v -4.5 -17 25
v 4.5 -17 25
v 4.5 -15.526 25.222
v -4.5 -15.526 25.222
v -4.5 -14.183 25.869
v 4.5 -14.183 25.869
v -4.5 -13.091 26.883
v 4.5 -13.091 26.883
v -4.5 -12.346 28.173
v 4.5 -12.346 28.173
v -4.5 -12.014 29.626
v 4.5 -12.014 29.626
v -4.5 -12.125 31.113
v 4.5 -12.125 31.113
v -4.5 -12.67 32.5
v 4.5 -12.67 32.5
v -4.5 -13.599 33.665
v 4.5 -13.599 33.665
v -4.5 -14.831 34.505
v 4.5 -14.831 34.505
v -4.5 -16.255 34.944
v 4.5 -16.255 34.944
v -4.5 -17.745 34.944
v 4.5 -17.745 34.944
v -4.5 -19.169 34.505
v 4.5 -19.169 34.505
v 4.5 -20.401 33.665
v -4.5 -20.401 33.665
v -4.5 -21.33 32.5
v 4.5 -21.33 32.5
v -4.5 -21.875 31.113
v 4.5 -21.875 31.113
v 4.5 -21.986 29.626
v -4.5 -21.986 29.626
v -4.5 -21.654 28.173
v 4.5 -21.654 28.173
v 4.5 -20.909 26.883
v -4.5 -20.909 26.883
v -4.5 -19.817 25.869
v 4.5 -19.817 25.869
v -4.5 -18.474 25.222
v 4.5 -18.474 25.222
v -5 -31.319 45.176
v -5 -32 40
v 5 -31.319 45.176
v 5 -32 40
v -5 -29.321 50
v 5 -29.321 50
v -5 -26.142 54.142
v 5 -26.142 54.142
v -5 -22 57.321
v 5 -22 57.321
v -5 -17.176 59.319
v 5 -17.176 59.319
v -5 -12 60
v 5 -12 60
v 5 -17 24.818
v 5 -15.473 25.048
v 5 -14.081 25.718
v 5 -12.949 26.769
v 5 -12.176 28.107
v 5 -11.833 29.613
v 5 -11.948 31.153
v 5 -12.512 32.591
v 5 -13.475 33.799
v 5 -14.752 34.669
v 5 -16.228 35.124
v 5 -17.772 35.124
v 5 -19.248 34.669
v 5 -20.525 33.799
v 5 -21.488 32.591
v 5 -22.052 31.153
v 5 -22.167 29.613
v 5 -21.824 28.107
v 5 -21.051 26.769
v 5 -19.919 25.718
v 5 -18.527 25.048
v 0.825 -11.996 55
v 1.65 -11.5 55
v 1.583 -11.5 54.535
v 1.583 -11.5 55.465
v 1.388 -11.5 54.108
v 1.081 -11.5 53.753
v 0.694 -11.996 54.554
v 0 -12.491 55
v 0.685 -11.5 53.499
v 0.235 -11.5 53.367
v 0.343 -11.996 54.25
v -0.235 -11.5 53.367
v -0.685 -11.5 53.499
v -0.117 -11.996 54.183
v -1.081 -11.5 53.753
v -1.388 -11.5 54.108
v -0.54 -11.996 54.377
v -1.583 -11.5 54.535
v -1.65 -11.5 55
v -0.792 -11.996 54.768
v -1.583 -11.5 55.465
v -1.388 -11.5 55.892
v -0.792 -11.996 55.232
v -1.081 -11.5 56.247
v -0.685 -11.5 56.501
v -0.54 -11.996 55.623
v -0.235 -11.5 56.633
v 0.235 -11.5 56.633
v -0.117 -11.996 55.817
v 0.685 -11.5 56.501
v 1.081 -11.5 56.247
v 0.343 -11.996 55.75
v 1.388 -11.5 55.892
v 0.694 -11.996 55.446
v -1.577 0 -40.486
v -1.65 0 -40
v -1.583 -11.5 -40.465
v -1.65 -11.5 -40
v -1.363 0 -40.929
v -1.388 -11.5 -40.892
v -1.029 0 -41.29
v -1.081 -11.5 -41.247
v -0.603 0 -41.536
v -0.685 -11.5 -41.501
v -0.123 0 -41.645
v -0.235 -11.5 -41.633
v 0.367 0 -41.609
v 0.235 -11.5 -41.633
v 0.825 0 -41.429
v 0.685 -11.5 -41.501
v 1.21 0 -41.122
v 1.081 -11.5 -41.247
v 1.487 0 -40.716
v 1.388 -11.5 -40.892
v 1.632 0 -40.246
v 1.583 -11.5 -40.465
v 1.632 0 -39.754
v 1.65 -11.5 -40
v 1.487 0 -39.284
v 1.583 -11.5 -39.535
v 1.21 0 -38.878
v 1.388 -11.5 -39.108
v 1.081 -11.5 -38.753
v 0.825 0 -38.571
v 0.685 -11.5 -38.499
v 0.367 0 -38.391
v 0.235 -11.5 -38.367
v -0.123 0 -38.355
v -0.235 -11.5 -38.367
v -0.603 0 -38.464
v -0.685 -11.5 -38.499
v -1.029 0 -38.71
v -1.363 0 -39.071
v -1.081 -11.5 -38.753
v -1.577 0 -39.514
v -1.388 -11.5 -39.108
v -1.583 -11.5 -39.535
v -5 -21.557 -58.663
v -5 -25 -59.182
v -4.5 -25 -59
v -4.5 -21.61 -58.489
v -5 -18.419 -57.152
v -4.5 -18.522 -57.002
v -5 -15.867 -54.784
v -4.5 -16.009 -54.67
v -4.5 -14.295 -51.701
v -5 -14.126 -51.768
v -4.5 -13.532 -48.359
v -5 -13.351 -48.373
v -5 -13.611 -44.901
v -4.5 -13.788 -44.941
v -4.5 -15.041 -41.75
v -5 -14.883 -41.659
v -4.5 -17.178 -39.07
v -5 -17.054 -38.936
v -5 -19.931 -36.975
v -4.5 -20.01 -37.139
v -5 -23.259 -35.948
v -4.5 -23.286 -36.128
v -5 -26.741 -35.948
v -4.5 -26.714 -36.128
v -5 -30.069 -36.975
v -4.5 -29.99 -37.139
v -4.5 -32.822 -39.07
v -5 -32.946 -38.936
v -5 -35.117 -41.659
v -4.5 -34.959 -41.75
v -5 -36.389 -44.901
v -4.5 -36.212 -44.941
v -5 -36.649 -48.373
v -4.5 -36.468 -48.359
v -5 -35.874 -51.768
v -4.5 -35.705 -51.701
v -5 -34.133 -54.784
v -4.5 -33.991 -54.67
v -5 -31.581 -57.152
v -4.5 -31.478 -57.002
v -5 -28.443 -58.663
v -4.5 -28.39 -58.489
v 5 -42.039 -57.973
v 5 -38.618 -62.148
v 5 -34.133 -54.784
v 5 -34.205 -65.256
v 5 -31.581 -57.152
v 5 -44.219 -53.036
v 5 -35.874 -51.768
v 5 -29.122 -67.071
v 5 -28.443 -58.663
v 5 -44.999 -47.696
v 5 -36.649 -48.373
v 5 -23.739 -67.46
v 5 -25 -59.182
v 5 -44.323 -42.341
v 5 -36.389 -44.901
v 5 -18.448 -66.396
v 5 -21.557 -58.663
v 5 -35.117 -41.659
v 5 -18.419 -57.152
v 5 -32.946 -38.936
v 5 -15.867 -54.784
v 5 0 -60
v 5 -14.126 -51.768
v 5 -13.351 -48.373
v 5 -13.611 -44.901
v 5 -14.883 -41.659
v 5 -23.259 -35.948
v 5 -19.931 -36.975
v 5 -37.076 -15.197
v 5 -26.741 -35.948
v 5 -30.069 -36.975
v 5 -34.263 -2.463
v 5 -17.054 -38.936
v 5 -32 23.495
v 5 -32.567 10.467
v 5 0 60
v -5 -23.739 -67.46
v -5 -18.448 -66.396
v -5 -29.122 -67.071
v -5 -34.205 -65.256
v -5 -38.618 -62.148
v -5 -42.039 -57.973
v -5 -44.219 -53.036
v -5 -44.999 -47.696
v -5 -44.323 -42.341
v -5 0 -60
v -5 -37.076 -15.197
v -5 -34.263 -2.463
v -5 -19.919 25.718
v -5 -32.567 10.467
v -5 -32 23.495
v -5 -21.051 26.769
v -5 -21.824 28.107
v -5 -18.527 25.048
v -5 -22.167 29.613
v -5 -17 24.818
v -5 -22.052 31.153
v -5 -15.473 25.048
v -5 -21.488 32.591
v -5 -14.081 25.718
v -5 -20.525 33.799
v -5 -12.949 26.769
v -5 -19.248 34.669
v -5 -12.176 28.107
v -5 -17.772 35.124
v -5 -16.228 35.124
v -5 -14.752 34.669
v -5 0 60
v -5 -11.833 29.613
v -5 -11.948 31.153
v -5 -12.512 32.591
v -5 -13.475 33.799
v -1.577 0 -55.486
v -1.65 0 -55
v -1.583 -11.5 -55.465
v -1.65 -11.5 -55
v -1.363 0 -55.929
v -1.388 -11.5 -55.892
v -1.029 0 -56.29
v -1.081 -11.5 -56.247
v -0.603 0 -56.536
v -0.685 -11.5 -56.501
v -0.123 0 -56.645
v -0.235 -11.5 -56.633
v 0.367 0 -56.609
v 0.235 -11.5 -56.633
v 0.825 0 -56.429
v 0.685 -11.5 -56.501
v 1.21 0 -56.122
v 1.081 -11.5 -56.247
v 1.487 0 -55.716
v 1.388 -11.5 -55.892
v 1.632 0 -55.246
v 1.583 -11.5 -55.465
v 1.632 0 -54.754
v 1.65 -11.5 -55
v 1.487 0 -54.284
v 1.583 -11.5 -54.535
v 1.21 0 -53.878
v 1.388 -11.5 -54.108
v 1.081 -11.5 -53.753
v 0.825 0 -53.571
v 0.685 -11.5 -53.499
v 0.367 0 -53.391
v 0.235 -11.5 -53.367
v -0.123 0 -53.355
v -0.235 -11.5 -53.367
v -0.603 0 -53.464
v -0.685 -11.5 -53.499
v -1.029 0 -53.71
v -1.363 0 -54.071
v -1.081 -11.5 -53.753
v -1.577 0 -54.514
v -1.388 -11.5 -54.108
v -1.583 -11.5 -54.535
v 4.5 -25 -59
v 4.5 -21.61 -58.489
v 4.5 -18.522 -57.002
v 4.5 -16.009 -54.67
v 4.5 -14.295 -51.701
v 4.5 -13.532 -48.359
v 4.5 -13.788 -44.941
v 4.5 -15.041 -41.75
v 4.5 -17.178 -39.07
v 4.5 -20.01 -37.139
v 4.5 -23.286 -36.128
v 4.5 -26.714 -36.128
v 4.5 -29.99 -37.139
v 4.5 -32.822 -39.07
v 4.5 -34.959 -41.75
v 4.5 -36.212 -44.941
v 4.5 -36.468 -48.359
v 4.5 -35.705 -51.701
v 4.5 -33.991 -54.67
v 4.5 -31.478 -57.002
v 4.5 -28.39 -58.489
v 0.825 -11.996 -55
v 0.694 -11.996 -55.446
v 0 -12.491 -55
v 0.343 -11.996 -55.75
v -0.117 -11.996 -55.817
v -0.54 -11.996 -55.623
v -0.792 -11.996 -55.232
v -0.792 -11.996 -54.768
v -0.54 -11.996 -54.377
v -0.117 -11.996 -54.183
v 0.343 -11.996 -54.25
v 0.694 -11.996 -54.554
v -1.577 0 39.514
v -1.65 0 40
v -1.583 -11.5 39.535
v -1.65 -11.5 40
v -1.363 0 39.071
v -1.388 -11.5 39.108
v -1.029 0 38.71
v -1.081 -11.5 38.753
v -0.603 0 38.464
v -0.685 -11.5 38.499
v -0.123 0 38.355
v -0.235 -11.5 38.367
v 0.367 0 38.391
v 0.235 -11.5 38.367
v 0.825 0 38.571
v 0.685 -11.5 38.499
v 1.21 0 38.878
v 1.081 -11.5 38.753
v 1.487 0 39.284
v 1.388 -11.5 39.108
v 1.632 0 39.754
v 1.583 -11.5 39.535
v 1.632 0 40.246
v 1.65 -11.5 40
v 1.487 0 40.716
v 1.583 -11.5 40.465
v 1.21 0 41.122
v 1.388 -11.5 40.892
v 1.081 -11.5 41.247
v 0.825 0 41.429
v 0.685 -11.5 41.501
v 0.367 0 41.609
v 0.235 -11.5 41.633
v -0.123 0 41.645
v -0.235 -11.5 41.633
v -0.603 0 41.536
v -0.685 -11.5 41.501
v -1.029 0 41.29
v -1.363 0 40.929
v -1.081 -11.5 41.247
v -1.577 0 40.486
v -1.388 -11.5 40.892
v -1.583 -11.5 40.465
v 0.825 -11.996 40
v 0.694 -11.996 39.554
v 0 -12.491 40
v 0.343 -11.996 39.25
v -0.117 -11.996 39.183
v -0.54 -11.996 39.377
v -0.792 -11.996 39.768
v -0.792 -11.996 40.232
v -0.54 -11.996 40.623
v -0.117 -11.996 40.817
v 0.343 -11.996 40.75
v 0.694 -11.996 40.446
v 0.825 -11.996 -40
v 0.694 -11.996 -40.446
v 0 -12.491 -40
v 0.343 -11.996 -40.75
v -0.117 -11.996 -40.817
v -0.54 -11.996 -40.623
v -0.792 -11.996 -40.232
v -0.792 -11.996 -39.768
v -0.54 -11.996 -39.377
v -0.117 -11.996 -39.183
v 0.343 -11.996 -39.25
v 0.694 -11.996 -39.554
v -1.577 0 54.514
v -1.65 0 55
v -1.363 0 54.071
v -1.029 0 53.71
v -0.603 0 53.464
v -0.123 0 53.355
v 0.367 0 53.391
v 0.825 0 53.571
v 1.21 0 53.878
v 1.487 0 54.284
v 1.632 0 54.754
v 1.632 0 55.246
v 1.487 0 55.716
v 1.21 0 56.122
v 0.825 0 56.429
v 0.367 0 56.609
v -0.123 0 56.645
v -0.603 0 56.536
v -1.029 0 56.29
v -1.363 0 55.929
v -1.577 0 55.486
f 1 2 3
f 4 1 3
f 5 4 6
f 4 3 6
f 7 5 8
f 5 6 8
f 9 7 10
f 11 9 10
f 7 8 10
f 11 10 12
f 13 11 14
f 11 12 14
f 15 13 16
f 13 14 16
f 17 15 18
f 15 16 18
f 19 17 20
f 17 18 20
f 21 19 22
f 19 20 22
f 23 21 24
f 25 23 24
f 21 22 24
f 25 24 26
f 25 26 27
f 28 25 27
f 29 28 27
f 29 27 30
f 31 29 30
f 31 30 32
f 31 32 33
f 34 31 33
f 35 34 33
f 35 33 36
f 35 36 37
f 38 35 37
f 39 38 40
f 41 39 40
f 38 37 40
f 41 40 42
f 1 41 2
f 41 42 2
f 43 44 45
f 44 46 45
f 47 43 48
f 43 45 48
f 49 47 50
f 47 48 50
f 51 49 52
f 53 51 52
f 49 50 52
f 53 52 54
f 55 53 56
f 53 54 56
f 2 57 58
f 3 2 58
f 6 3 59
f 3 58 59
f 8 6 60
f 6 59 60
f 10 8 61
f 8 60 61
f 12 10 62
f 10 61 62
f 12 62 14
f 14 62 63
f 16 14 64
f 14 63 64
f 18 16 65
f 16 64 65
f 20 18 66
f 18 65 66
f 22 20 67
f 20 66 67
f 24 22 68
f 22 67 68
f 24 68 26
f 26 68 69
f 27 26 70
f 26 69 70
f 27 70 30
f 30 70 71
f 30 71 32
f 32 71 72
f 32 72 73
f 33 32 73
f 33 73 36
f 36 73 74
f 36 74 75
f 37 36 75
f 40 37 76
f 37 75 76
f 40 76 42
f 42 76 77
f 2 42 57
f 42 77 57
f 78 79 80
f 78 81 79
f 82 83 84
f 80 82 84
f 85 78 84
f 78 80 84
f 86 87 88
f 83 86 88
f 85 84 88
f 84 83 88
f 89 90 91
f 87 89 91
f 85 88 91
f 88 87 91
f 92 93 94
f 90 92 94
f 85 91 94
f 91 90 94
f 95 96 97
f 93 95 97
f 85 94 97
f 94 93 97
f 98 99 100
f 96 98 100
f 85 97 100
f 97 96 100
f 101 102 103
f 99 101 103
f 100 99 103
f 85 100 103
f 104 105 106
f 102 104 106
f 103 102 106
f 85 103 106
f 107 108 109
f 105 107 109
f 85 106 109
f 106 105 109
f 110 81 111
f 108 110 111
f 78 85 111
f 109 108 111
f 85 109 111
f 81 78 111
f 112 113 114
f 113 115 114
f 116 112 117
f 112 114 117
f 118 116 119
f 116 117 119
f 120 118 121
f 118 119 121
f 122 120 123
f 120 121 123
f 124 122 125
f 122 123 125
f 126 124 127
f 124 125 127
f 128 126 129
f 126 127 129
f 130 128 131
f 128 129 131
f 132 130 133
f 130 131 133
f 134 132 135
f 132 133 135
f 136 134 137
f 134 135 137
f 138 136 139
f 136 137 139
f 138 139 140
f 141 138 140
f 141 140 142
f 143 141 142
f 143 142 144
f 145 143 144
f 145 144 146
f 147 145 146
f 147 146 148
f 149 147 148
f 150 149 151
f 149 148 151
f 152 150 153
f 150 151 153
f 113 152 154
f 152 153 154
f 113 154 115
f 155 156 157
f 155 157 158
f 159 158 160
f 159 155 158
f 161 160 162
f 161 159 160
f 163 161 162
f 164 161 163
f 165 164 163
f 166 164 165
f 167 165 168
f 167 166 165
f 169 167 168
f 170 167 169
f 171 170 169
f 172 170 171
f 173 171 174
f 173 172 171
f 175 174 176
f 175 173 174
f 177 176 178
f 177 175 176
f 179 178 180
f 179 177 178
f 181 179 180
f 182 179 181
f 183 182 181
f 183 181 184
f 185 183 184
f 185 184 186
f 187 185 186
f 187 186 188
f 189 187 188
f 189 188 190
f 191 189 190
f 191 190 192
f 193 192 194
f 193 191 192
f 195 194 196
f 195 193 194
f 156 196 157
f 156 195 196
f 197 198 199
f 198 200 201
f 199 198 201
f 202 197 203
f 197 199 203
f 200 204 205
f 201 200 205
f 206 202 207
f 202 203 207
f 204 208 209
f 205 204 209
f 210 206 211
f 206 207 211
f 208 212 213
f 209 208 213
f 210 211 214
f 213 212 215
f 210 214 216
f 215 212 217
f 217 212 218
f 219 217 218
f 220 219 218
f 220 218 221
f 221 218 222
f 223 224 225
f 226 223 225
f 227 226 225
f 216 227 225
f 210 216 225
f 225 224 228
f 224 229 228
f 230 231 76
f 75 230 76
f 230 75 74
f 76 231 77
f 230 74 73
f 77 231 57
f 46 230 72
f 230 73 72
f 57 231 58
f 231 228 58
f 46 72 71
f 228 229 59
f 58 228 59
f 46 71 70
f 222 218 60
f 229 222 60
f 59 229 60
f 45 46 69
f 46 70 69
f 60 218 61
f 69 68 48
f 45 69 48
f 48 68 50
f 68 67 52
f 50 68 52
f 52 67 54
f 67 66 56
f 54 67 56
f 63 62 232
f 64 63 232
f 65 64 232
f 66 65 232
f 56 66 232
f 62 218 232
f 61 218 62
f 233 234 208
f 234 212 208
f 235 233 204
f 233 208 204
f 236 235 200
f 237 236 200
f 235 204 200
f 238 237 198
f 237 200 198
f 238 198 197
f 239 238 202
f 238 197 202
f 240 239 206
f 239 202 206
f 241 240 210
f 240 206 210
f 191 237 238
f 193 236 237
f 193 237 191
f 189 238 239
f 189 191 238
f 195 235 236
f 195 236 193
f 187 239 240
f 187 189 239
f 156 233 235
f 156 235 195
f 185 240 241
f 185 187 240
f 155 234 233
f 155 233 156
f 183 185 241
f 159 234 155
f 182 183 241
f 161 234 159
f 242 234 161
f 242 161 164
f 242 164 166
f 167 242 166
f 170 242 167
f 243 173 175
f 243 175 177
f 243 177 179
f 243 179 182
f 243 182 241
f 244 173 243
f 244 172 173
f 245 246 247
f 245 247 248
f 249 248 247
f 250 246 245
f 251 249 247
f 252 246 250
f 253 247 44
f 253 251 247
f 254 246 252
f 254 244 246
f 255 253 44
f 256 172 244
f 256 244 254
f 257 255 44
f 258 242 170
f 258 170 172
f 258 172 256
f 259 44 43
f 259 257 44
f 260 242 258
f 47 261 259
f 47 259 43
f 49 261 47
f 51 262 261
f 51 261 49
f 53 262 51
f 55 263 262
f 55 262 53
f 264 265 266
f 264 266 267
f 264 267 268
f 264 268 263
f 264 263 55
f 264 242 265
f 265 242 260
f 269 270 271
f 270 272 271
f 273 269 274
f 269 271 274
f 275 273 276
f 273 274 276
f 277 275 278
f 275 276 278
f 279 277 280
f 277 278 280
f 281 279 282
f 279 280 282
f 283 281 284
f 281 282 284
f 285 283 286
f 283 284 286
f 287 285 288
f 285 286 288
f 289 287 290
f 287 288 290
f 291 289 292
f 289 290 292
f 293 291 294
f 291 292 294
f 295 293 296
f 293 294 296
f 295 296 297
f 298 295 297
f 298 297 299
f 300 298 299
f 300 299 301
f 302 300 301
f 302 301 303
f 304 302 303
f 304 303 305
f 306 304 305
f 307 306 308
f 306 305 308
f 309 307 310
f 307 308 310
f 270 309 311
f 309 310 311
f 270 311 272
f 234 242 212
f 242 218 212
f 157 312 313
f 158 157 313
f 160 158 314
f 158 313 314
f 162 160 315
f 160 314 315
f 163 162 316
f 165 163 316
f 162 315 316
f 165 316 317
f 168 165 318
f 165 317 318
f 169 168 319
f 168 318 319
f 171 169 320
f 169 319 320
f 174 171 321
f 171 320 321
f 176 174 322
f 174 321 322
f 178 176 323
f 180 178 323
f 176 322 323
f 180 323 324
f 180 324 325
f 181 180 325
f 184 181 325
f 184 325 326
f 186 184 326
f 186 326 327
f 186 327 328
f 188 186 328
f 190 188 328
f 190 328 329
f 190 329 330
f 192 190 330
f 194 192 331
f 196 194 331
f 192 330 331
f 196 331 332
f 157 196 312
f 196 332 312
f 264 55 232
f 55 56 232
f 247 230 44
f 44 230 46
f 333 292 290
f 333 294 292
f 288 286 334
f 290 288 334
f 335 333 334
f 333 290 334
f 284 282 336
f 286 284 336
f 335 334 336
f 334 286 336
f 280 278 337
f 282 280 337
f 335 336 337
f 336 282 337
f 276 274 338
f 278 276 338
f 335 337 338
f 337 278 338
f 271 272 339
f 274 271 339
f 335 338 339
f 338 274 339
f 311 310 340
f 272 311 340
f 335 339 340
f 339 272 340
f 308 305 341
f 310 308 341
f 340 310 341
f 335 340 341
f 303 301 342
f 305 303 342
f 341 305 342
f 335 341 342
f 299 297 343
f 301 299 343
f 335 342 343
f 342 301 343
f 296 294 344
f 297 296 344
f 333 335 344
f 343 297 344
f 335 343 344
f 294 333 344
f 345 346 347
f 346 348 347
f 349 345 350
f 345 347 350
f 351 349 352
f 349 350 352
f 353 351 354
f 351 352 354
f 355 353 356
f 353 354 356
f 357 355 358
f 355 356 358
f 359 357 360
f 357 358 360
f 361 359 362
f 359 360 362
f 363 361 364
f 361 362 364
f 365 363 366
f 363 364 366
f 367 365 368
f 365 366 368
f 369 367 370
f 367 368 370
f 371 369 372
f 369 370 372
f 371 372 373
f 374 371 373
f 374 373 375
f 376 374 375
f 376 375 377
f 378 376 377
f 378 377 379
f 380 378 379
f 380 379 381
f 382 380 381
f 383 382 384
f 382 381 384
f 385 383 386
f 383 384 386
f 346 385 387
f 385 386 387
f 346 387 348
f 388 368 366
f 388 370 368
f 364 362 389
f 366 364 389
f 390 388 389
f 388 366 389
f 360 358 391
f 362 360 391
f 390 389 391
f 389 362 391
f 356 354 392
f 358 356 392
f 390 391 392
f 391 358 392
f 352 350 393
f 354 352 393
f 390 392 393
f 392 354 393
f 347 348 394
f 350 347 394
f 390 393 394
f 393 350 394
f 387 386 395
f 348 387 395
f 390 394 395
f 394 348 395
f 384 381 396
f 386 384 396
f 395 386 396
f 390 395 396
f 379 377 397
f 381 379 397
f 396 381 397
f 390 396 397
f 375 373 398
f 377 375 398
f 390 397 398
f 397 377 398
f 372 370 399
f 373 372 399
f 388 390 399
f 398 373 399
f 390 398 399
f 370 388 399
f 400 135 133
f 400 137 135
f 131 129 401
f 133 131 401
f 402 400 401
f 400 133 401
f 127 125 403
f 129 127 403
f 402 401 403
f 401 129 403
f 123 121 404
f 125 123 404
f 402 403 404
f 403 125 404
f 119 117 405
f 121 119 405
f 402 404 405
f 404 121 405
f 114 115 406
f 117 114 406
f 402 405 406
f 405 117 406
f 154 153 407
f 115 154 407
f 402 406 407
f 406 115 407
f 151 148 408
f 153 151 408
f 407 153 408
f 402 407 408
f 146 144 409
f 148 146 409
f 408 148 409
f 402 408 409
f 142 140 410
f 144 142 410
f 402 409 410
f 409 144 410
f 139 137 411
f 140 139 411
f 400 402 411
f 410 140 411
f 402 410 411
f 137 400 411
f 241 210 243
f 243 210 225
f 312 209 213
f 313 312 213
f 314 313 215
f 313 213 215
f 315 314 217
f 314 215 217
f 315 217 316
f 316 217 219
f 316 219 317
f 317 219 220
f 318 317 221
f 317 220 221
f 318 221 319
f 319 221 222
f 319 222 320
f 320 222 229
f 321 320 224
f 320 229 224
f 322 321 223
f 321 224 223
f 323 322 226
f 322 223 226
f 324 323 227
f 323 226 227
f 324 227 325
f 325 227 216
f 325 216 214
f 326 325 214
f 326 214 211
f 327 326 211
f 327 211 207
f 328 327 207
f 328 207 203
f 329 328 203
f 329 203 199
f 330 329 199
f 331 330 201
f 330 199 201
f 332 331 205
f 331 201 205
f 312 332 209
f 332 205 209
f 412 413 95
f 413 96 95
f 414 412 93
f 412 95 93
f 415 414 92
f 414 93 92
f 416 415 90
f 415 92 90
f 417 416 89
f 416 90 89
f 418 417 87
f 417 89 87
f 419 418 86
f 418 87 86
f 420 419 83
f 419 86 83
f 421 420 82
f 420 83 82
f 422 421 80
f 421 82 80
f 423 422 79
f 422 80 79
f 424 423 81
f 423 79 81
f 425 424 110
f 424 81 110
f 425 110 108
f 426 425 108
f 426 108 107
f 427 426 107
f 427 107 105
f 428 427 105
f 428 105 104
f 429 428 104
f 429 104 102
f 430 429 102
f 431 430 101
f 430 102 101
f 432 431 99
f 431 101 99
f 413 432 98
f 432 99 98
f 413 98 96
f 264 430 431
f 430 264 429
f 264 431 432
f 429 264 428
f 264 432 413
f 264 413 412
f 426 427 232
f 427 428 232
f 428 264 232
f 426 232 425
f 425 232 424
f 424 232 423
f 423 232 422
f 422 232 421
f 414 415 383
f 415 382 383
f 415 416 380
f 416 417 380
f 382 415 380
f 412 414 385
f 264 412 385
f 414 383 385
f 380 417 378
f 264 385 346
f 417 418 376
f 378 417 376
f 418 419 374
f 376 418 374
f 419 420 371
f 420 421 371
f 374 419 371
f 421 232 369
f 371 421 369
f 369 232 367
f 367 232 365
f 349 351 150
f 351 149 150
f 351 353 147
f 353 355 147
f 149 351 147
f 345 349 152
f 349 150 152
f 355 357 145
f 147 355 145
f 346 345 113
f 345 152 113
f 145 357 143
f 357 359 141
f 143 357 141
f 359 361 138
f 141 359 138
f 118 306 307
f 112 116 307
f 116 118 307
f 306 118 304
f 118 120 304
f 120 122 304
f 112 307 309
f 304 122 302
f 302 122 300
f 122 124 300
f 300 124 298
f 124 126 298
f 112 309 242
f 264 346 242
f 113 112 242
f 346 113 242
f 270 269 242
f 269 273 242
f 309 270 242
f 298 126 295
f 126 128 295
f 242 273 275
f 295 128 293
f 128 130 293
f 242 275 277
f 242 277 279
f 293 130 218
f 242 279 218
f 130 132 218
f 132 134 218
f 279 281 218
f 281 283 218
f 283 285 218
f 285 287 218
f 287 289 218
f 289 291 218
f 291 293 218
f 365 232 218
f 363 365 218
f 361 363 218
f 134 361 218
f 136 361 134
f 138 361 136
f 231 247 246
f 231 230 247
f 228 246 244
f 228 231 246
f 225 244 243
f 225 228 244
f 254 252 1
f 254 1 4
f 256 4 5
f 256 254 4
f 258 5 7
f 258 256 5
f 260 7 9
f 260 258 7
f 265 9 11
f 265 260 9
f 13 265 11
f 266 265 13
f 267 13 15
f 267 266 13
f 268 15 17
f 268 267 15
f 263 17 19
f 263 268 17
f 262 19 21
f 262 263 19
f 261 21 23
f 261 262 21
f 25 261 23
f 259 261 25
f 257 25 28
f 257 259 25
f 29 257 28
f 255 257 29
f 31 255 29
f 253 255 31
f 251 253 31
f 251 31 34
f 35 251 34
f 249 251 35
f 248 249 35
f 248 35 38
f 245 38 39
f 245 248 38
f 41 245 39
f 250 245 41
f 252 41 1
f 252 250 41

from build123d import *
from OCP.BRepFilletAPI import BRepFilletAPI_MakeChamfer

# Parameters (mm, degrees)
BOSS_EXTRUDE1_DEPTH   = 5
SKETCH4_R             = 11.5
CUT_EXTRUDE1_DEPTH    = 10
M4_TAPPED_HOLE1_D     = 3.3
M4_TAPPED_HOLE1_DEPTH = 11.5
M4_TAPPED_HOLE1_TIP   = 0.991420021
SKETCH5_R             = 5
CUT_EXTRUDE2_DEPTH    = 10
FILLET1_R             = 150
FILLET2_R             = 20
CHAMFER1_SIZE         = 0.5
CHAMFER1_SIZE2        = 0.181985117


with BuildPart() as part:
    # Sketch1 → Boss-Extrude1 (new, symmetric)
    with BuildSketch(Plane(origin=(0, 0, 0), x_dir=(0, 0, -1), z_dir=(1, 0, 0))):
        with BuildLine():
            Line((-60, 0), (60, 0))
            Line((60, 0), (66.396399481, -18.448199741))
            ThreePointArc((66.396399481, -18.448199741), (62.147804381, -38.6177027), (42.341065464, -44.323182824))
            Line((42.341065464, -44.323182824), (-3.816355809, -32))
            Line((-3.816355809, -32), (-60, -32))
            Line((-60, -32), (-60, 0))
        make_face()
    extrude(amount=BOSS_EXTRUDE1_DEPTH, both=True)

    # Sketch4 → Cut-Extrude1 (cut)
    with BuildSketch(Plane(origin=(5, 0, 0), x_dir=(0, 0, -1), z_dir=(1, 0, 0))):
        with Locations((47.5, -25)):
            Circle(SKETCH4_R)
    extrude(amount=-CUT_EXTRUDE1_DEPTH, mode=Mode.SUBTRACT)

    # M4 Tapped Hole1
    with Locations(Plane(origin=(0, 0, 0), x_dir=(1, 0, 0), z_dir=(0, 1, 0))):
        with Locations((0, -55), (0, -40), (0, 40), (0, 55)):
            Hole(M4_TAPPED_HOLE1_D / 2, depth=M4_TAPPED_HOLE1_DEPTH)
            with Locations((0, 0, -(M4_TAPPED_HOLE1_DEPTH + M4_TAPPED_HOLE1_TIP / 2))):  # 118° drill point
                Cone(0, M4_TAPPED_HOLE1_D / 2, M4_TAPPED_HOLE1_TIP, mode=Mode.SUBTRACT)

    # Sketch5 → Cut-Extrude2 (cut)
    with BuildSketch(Plane(origin=(5, 0, 0), x_dir=(0, 0, -1), z_dir=(1, 0, 0))):
        with Locations((-30, -17)):
            Circle(SKETCH5_R)
    extrude(amount=-CUT_EXTRUDE2_DEPTH, mode=Mode.SUBTRACT)

    # Fillet1
    fillet1_edges = [part.edges().sort_by_distance(p)[0] for p in [
        (0, -32, 3.816355809),
    ]]
    fillet(fillet1_edges, radius=FILLET1_R)

    # Fillet2
    fillet2_edges = [part.edges().sort_by_distance(p)[0] for p in [
        (0, -32, 60),
    ]]
    fillet(fillet2_edges, radius=FILLET2_R)

    # Chamfer1: one chamfer whose edges measure the first distance from different faces: ONE call of the kernel's chamfer builder (chamfer() names one face for all edges)
    chamfer1_edges_1 = [part.edges().sort_by_distance(p)[0] for p in [
        (-5, -25, -36),
        (5, -25, -36),
    ]]
    chamfer1_side_1 = [part.faces().sort_by_distance(p)[0] for p in [
        (0, -25, -36),
    ]]
    chamfer1_edges_2 = [part.edges().sort_by_distance(p)[0] for p in [
        (-5, -17, 35),
        (5, -17, 35),
    ]]
    chamfer1_side_2 = [part.faces().sort_by_distance(p)[0] for p in [
        (0, -17, 35),
    ]]
    chamfer1 = BRepFilletAPI_MakeChamfer(part.part.solid().wrapped)
    for e in chamfer1_edges_1:
        chamfer1.Add(CHAMFER1_SIZE, CHAMFER1_SIZE2, e.wrapped, chamfer1_side_1[0].wrapped)  # the first distance lies on this face
    for e in chamfer1_edges_2:
        chamfer1.Add(CHAMFER1_SIZE, CHAMFER1_SIZE2, e.wrapped, chamfer1_side_2[0].wrapped)  # the first distance lies on this face
    add(Compound.cast(chamfer1.Shape()), mode=Mode.REPLACE)


solid = part.part
